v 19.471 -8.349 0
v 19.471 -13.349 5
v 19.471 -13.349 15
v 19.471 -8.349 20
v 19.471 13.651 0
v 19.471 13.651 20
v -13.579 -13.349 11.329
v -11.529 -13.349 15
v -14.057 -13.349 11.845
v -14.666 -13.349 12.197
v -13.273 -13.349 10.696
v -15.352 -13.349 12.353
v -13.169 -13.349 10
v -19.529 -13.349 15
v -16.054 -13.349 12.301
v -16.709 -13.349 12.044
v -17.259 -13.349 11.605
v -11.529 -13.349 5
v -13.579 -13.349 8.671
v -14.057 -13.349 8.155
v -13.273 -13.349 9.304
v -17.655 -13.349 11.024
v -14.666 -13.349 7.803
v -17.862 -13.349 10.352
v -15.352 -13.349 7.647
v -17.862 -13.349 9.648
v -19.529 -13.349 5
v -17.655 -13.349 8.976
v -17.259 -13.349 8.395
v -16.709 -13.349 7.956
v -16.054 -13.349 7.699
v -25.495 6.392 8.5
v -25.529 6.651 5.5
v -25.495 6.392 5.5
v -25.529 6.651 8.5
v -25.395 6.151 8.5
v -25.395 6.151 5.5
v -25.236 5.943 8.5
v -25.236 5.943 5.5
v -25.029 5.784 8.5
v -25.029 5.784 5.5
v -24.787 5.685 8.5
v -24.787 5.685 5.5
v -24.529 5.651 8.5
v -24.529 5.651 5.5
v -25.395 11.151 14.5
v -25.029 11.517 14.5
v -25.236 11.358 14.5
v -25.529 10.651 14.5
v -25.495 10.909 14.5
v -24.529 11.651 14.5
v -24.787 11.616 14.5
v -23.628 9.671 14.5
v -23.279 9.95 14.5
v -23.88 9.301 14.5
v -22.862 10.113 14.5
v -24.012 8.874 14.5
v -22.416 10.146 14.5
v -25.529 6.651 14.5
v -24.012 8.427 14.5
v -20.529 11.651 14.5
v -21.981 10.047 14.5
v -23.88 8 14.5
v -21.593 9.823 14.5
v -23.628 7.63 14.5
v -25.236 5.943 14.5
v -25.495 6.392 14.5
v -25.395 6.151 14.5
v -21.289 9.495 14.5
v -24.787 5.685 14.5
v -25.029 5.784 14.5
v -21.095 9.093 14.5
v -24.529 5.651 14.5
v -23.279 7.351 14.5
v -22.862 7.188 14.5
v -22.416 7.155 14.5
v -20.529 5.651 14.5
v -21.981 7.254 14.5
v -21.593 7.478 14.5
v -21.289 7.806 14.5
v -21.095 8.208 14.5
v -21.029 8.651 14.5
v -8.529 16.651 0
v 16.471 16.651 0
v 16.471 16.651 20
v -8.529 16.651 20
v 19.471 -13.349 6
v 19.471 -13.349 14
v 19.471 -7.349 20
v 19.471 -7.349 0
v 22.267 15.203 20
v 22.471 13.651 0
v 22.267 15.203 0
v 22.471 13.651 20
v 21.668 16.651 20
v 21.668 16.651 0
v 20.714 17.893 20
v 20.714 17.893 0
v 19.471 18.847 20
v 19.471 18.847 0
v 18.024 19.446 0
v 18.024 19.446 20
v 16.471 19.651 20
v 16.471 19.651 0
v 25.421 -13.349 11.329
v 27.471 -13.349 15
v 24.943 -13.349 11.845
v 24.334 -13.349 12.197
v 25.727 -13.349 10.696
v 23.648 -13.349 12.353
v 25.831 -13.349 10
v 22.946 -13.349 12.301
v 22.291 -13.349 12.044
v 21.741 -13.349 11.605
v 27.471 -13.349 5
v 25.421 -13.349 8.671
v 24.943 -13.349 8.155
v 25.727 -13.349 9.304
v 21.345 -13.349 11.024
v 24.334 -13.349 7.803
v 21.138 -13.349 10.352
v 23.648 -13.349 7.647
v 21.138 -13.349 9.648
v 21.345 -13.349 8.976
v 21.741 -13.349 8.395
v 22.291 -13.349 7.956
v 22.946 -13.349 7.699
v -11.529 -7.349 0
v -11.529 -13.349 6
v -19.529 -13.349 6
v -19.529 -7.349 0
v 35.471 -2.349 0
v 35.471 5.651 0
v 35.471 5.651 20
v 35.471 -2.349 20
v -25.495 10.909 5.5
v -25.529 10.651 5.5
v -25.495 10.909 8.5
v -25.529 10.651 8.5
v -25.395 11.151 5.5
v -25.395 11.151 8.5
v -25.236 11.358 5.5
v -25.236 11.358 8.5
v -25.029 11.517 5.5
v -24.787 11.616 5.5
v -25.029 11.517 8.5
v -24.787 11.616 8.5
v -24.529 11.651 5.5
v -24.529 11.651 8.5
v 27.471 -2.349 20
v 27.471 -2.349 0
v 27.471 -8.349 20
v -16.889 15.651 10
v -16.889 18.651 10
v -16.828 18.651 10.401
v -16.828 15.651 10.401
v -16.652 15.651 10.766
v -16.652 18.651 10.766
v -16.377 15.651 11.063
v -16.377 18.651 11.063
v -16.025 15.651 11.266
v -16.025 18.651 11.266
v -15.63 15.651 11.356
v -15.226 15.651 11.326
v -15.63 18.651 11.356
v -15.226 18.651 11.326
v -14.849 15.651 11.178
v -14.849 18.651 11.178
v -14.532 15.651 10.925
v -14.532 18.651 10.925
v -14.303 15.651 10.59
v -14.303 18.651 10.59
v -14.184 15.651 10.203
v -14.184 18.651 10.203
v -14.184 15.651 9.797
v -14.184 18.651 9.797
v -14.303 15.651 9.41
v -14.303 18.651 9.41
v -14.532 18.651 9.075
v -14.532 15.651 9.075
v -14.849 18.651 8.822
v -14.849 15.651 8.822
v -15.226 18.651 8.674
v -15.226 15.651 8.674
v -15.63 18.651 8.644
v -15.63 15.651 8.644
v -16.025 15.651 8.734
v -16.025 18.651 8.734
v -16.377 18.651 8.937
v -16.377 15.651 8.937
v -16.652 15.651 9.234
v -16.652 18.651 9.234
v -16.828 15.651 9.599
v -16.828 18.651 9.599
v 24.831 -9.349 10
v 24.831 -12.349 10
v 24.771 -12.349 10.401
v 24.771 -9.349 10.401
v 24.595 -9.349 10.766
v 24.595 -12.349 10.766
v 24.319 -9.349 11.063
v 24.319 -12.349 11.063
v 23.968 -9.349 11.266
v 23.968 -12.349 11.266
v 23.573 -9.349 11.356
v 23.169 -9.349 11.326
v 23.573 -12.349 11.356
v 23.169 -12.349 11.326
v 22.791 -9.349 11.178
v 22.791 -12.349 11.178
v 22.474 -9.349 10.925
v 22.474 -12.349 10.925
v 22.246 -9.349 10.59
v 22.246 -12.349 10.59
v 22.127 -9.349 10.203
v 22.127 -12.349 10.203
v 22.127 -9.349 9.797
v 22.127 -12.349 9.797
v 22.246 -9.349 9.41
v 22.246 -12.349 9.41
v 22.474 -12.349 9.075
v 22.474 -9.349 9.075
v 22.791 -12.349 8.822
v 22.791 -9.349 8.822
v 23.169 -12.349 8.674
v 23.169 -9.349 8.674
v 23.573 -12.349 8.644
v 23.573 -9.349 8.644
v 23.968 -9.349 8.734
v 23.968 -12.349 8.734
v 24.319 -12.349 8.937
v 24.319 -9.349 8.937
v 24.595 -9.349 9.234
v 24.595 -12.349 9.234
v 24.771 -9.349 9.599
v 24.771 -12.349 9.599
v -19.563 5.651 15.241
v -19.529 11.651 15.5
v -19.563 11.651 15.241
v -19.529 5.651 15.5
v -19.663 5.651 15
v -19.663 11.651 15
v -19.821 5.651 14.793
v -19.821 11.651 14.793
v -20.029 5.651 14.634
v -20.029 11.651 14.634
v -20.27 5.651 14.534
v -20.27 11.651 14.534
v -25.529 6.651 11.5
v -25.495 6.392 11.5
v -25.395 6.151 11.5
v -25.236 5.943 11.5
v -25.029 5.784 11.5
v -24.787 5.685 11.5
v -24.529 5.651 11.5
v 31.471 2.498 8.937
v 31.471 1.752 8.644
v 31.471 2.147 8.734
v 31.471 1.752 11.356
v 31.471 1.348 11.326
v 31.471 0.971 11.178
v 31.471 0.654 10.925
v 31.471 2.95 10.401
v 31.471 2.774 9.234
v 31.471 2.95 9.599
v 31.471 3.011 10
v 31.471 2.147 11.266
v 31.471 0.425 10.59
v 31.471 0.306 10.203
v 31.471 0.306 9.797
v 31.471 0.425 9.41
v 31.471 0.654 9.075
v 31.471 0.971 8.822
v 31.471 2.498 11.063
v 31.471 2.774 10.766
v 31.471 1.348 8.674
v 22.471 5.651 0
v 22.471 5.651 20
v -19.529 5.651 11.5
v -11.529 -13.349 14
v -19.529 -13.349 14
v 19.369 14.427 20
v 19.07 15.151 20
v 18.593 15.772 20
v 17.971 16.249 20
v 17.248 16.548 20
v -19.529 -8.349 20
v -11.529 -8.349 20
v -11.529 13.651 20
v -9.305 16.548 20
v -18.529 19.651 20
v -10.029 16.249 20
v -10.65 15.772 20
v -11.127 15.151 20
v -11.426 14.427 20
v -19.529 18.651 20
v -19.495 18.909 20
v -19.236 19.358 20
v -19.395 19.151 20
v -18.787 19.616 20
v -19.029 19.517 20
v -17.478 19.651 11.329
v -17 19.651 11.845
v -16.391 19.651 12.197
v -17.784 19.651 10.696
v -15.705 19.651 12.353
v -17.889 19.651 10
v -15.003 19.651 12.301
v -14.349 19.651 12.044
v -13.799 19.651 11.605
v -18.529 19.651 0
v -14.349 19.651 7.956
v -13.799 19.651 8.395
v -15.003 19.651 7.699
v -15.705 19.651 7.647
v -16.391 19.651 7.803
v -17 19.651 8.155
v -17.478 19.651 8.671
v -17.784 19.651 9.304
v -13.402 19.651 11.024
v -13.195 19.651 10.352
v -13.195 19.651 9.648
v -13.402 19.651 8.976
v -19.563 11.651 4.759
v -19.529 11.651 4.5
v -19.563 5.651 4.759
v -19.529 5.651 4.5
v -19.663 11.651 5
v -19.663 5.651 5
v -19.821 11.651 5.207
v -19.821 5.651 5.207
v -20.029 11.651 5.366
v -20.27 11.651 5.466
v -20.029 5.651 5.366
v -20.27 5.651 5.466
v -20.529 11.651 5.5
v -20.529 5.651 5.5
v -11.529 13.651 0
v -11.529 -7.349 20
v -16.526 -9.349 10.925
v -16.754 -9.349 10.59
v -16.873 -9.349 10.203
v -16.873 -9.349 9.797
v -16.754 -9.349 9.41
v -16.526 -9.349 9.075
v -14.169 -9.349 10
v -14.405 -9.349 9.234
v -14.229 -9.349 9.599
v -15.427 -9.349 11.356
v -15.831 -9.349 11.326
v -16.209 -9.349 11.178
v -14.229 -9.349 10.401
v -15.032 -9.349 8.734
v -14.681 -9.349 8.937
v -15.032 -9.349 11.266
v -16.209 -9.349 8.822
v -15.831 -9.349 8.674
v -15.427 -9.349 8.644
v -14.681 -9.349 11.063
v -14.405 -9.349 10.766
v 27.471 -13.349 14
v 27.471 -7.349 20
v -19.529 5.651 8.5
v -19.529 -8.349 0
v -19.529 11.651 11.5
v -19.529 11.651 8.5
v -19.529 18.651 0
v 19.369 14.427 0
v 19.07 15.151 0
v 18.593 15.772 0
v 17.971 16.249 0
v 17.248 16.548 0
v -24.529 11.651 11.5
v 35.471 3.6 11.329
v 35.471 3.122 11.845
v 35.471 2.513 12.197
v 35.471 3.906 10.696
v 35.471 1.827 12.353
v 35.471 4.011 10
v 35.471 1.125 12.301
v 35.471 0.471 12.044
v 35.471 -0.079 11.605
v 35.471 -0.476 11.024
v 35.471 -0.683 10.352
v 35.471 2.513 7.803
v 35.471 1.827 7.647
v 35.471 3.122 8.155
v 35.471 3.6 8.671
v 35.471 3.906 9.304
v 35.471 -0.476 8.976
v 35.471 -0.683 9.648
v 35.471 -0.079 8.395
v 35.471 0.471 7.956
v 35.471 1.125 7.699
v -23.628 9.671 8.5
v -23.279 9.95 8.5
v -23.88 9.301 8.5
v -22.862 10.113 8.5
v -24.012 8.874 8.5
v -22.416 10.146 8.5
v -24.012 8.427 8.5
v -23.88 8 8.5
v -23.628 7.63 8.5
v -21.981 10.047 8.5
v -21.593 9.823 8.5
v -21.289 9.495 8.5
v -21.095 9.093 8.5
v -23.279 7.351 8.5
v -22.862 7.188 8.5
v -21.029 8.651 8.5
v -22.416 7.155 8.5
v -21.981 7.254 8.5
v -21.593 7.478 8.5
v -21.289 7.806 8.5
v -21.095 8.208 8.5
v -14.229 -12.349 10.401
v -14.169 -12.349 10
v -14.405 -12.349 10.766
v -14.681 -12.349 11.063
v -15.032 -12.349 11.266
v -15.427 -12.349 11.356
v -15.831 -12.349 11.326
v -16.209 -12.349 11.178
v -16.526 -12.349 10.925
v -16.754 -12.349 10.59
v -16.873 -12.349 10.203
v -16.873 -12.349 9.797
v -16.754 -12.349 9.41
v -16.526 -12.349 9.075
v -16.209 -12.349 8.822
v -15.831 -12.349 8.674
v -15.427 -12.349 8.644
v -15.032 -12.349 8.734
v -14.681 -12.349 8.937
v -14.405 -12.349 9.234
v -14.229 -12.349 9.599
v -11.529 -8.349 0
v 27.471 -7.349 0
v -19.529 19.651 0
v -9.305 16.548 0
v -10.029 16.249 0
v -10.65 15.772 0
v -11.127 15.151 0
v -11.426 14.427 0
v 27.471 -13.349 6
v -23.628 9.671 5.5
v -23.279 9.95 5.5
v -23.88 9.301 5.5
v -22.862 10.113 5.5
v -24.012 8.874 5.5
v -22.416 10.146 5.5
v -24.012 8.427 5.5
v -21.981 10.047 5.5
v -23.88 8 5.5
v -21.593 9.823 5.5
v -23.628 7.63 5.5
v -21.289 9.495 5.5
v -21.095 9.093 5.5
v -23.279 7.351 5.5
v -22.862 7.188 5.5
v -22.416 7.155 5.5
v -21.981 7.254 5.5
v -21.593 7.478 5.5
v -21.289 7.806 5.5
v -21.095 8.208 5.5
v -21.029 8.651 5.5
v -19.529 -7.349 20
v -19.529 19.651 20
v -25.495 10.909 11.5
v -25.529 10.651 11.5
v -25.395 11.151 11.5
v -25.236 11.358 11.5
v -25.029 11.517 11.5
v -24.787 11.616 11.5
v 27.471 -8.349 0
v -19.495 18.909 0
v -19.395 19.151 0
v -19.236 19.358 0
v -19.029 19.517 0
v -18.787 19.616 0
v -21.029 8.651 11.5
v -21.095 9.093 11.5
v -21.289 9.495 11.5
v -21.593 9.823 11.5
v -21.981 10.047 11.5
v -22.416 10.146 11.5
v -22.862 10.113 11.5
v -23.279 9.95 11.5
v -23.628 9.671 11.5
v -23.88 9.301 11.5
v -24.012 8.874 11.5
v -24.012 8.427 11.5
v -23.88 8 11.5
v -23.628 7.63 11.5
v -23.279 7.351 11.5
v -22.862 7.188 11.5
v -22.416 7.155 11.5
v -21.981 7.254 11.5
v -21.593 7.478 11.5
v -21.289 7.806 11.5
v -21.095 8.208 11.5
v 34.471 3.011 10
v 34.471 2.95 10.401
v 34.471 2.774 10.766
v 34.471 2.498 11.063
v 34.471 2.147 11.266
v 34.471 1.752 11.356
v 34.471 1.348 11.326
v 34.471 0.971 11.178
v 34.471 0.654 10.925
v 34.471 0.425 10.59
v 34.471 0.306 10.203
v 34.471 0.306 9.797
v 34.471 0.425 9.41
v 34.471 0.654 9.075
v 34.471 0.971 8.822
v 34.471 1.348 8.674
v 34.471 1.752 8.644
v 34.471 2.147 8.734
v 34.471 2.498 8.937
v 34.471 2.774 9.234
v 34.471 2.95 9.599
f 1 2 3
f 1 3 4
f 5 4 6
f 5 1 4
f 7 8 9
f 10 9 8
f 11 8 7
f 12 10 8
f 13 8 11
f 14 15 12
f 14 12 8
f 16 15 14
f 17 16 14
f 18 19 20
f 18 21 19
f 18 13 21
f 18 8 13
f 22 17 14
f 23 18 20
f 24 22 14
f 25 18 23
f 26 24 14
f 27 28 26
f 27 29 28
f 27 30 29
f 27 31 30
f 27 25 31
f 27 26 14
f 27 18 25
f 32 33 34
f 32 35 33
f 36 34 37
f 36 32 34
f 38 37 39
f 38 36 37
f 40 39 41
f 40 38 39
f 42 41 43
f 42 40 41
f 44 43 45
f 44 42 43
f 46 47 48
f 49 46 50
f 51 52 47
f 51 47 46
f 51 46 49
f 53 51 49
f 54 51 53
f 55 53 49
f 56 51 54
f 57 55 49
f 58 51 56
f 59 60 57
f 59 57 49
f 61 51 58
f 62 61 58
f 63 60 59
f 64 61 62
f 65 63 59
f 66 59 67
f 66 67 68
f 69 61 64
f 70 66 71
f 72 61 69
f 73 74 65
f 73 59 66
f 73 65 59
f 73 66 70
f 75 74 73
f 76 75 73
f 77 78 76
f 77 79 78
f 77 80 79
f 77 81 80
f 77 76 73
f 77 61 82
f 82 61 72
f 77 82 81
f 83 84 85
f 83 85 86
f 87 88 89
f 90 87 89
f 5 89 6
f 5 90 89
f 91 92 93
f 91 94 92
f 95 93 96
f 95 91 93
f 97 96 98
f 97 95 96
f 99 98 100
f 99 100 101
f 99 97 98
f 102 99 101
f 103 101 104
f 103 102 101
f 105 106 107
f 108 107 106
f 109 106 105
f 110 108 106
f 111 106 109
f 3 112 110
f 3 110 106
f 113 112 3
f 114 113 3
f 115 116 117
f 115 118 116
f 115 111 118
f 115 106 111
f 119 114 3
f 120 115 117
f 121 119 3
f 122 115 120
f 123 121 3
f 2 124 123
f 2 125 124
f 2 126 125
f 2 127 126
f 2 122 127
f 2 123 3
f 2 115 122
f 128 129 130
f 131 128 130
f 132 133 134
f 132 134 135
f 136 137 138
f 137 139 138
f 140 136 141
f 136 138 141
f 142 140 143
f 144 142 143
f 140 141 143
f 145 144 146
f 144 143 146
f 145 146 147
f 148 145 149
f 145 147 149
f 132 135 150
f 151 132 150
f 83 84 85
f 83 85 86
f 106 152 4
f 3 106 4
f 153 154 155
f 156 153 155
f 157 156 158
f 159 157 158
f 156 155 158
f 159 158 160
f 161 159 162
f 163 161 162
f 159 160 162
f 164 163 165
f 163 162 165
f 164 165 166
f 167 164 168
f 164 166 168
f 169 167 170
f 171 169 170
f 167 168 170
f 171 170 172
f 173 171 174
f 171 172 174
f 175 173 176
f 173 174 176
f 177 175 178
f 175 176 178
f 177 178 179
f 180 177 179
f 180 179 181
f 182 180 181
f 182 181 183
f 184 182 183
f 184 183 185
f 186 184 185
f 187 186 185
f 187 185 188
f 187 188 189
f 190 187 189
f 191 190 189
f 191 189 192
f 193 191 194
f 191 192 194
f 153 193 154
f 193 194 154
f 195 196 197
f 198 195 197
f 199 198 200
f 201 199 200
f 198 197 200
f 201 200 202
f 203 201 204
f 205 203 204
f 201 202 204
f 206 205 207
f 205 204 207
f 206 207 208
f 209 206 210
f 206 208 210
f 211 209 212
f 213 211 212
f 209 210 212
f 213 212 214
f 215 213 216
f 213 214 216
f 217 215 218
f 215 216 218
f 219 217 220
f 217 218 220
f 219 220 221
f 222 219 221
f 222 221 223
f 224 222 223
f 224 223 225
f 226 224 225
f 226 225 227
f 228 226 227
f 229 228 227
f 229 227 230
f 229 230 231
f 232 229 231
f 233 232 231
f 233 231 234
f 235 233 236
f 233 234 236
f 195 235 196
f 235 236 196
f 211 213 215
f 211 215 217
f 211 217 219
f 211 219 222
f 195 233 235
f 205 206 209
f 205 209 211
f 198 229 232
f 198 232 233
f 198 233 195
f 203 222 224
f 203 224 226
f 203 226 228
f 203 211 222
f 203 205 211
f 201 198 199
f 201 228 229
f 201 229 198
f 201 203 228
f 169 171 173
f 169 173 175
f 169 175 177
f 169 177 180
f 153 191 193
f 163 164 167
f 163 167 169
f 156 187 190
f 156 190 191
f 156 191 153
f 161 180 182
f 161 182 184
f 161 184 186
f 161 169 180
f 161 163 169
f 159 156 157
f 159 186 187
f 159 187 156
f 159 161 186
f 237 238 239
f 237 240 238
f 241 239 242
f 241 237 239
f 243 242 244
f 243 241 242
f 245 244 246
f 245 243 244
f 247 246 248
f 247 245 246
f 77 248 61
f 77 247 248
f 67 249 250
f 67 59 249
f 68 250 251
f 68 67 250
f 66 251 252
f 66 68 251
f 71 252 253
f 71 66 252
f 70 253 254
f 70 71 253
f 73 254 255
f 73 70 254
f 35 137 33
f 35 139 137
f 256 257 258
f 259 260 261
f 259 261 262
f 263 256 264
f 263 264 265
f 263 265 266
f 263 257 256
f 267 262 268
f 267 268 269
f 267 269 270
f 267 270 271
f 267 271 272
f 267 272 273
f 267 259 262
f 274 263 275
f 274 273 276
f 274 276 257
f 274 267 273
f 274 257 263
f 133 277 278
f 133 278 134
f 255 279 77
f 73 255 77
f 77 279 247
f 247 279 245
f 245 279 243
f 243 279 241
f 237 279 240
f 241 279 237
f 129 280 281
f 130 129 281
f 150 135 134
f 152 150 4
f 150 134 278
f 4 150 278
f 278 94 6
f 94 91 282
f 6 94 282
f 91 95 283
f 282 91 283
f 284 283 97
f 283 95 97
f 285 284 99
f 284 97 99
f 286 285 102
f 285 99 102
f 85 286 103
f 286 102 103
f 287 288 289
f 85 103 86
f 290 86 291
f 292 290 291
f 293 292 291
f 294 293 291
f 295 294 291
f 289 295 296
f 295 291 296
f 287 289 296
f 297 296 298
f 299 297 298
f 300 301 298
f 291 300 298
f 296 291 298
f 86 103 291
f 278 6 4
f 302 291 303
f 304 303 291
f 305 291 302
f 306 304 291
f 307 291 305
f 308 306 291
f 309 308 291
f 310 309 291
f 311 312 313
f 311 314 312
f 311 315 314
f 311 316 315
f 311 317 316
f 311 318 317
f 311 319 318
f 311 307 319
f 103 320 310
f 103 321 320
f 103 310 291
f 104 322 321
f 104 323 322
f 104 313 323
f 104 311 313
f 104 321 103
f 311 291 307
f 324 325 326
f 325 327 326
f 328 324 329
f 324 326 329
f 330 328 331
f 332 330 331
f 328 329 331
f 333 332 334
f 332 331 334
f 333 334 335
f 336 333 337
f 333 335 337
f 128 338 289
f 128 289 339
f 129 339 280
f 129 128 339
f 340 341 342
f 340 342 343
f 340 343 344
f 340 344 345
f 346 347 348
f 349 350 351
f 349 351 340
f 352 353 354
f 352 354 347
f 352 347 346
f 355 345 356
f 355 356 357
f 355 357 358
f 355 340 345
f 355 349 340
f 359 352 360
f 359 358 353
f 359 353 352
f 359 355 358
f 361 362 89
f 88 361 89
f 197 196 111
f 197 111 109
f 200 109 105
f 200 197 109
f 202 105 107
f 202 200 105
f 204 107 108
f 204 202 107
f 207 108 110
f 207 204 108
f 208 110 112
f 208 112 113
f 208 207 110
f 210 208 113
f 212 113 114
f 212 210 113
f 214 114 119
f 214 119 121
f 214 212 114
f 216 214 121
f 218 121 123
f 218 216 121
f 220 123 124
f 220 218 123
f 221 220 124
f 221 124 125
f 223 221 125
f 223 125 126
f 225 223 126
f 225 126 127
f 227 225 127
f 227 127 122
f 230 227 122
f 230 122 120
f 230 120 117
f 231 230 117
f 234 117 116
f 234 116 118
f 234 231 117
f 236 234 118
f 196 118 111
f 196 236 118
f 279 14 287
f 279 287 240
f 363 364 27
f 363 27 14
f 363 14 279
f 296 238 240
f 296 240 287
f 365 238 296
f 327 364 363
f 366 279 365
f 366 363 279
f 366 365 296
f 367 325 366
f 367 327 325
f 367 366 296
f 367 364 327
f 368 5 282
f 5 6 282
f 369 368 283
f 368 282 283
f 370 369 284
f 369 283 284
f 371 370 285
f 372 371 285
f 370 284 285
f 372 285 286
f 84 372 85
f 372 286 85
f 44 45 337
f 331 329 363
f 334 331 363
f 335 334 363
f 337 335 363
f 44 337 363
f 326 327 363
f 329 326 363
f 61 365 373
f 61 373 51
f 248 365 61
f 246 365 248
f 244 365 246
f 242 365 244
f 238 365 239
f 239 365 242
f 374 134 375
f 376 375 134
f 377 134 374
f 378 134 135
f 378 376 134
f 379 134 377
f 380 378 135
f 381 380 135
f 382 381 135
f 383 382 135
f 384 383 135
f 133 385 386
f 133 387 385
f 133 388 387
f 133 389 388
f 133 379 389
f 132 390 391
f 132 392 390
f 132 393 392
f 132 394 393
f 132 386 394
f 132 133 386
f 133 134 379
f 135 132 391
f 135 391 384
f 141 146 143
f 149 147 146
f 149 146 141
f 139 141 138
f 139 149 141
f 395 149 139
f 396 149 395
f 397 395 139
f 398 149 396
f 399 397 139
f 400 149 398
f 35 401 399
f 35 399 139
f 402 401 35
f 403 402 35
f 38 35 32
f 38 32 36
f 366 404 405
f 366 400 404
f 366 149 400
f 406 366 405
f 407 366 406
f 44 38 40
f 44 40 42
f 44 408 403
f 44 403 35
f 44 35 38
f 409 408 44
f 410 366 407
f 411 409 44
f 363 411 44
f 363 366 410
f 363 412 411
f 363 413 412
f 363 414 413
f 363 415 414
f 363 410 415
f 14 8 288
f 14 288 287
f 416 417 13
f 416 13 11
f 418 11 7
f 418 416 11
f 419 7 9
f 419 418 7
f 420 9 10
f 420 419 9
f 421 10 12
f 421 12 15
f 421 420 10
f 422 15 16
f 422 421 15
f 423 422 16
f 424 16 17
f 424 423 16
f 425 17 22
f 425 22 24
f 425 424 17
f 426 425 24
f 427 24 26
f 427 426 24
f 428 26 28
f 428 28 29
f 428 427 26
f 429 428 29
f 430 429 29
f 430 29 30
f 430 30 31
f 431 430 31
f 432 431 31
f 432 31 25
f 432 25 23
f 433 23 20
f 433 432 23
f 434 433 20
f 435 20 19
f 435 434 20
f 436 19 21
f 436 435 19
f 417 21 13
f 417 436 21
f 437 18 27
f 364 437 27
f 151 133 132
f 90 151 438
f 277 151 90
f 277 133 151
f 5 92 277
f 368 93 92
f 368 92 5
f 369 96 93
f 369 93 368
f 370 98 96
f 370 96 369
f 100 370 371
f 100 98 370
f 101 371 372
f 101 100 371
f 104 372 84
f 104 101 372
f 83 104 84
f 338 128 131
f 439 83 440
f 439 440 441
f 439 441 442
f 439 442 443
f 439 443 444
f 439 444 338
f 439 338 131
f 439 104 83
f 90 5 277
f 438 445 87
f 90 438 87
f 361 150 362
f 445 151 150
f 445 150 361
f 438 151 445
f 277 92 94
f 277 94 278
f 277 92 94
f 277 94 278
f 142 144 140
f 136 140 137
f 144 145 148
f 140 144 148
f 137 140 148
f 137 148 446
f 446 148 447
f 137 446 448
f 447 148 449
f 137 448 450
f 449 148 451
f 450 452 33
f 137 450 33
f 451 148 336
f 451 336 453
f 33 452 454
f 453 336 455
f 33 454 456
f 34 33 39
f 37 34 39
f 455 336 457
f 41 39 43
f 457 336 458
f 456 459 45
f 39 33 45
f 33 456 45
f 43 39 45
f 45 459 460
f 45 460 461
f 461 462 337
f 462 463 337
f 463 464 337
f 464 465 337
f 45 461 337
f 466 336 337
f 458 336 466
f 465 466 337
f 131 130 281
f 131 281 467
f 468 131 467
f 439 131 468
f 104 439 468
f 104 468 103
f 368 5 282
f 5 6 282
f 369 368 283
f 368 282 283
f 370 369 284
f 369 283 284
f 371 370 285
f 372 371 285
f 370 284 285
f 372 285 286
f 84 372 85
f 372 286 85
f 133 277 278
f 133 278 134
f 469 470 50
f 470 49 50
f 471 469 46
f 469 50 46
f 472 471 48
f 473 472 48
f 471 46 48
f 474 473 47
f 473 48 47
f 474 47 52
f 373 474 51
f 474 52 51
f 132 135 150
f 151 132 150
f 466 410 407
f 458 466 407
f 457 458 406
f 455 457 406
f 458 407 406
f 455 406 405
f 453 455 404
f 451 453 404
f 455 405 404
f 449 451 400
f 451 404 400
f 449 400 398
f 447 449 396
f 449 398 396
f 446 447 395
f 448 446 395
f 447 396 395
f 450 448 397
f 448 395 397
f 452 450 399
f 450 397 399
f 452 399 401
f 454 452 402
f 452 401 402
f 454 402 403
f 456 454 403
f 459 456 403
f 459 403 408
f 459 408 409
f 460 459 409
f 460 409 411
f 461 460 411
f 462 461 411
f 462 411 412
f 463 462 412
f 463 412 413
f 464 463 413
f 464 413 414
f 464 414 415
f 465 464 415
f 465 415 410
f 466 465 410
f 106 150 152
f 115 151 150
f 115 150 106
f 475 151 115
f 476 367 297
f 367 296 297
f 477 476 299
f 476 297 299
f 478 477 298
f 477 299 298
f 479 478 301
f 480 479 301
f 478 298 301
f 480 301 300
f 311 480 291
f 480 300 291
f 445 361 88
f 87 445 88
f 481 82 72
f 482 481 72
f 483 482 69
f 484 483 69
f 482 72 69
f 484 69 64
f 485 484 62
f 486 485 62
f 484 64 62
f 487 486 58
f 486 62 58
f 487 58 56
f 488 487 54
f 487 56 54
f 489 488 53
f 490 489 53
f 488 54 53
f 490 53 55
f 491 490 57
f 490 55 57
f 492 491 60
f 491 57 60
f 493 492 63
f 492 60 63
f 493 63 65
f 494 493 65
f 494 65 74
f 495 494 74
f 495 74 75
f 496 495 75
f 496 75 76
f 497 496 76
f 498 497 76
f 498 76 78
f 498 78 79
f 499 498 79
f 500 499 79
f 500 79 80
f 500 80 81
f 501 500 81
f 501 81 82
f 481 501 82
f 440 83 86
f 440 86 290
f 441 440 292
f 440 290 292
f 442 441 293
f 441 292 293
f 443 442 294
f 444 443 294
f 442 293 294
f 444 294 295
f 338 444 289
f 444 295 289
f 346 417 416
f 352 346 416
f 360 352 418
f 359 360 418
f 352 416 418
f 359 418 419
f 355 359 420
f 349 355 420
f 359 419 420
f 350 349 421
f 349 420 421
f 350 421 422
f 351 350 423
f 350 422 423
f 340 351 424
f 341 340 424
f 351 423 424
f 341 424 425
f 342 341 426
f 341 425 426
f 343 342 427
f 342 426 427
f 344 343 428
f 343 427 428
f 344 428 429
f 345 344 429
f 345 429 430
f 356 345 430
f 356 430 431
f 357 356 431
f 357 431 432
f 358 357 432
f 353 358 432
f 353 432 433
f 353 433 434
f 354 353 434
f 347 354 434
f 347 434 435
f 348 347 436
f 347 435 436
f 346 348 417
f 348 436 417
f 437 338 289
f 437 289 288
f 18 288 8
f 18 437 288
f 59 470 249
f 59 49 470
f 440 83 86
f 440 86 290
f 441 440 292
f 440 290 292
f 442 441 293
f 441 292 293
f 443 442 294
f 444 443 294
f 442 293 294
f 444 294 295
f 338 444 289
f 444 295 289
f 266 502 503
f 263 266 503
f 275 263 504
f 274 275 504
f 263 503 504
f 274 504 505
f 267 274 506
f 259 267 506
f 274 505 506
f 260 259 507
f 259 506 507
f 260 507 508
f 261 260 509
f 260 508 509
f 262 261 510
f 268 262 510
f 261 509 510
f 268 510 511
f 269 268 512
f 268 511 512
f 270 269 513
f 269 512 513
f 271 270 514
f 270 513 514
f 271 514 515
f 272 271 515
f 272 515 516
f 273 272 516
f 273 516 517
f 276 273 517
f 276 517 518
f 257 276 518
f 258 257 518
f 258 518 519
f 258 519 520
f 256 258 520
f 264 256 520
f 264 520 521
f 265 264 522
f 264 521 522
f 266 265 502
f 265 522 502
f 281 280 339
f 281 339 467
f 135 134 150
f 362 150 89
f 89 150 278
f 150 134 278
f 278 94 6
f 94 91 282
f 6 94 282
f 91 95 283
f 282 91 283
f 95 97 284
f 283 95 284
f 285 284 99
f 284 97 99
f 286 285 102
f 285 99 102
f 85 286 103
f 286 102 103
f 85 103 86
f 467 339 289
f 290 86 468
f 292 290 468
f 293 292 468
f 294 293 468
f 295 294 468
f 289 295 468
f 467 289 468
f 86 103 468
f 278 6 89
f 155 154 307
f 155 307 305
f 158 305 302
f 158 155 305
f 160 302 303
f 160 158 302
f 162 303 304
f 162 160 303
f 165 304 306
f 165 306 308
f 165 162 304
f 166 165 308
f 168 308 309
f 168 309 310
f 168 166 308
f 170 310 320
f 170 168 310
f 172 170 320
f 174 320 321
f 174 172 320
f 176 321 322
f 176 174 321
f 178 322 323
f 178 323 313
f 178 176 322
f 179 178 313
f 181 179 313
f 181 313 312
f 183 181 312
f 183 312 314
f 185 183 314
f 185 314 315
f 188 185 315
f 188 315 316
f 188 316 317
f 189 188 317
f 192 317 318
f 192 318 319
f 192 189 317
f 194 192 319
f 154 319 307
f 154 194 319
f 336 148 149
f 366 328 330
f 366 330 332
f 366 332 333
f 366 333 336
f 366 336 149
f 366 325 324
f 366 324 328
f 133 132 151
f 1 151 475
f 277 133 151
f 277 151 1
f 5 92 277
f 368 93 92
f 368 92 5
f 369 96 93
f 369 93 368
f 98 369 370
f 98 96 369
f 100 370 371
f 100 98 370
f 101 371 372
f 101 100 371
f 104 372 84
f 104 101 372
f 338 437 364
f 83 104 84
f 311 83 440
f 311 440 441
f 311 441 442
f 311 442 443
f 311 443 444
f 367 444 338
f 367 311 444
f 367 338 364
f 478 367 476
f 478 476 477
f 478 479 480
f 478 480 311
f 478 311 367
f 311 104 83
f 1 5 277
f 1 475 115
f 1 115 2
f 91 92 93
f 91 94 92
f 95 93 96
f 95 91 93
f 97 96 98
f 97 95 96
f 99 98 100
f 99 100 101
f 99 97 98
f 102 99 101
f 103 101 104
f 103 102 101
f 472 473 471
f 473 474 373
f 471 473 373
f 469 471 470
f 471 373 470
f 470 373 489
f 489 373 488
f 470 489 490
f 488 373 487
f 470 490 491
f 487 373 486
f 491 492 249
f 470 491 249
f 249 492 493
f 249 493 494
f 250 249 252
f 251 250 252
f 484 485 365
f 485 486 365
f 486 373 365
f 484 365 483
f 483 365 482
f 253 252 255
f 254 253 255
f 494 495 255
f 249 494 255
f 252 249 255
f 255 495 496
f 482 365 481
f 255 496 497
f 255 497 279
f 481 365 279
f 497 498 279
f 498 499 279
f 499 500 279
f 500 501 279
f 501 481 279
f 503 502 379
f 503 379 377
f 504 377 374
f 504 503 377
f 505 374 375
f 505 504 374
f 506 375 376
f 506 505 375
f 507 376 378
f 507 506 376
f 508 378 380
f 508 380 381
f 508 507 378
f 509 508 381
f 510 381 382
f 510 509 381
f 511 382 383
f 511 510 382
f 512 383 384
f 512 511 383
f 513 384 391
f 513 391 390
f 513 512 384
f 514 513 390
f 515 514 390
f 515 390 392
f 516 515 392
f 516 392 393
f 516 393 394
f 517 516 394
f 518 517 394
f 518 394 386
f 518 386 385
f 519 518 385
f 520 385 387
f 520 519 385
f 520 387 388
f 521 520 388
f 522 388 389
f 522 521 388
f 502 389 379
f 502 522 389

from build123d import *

# Parameters (mm, degrees)
PAD_DEPTH       = 20
FILLET_R        = 3
FILLET001_R     = 6
CHAMFER_SIZE    = 6
SKETCH002_R     = 1.36
POCKET_DEPTH    = 4
CHAMFER001_SIZE = 1
SKETCH003_R     = 1.36
POCKET001_DEPTH = 4
CHAMFER002_SIZE = 1
SKETCH004_R     = 1.36
POCKET002_DEPTH = 4
CHAMFER003_SIZE = 1
CHAMFER004_SIZE = 5
SKETCH005_R     = 1.36
POCKET003_DEPTH = 4
CHAMFER005_SIZE = 1
SKETCH006_W     = 6
SKETCH006_H     = 3
PAD001_DEPTH    = 6
SKETCH007_R     = 1.5
POCKET004_DEPTH = 14.501
FILLET002_R     = 1
FILLET003_R     = 1
FILLET004_R     = 1


with BuildPart() as fillet001:
    # Sketch → Pad (new body)
    with BuildSketch(Plane.XY):
        Polygon((-19.528576, -13.349491), (-19.528576, 19.650509), (22.471424, 19.650509), (22.471424, 5.650509), (35.471424, 5.650509), (35.471424, -2.349491), (27.471424, -2.349491), (27.471424, -13.349491), (19.471424, -13.349491), (19.471424, 16.650509), (-11.528576, 16.650509), (-11.528576, -13.349491), align=None)
    extrude(amount=PAD_DEPTH)

    # Fillet
    fillet_edges = [fillet001.edges().sort_by_distance(p)[0] for p in [
        (-11.528576, 16.650509, 10),
        (19.471424, 16.650509, 10),
    ]]
    fillet(fillet_edges, radius=FILLET_R)

    # Fillet001
    fillet001_edges = [fillet001.edges().sort_by_distance(p)[0] for p in [
        (22.471424, 19.650509, 10),
    ]]
    fillet(fillet001_edges, radius=FILLET001_R)


with BuildPart() as chamfer_body:
    # Chamfer base: copy of Fillet001
    add(fillet001.part)

    # Chamfer
    chamfer_edges = [chamfer_body.edges().sort_by_distance(p)[0] for p in [
        (-15.528576, -13.349491, 20),
        (-15.528576, -13.349491, 0),
        (23.471424, -13.349491, 20),
        (23.471424, -13.349491, 0),
    ]]
    chamfer(chamfer_edges, length=CHAMFER_SIZE)


with BuildPart() as definitiva:
    # Pocket base: copy of Fillet001
    add(fillet001.part)

    # Sketch002 → Pocket (cut)
    with BuildSketch(Plane.YZ.offset(35.471424)):
        with Locations((1.650509, 10)):
            Circle(SKETCH002_R)
    extrude(amount=-POCKET_DEPTH, mode=Mode.SUBTRACT)

    # Chamfer001
    chamfer001_edges = [definitiva.edges().sort_by_distance(p)[0] for p in [
        (35.471424, 0.290509, 10),
    ]]
    chamfer(chamfer001_edges, length=CHAMFER001_SIZE)

    # Sketch003 → Pocket001 (cut)
    with BuildSketch(Plane.XZ.offset(13.349491)):
        with Locations((-15.528576, 10)):
            Circle(SKETCH003_R)
    extrude(amount=-POCKET001_DEPTH, mode=Mode.SUBTRACT)

    # Chamfer002
    chamfer002_edges = [definitiva.edges().sort_by_distance(p)[0] for p in [
        (-16.888576, -13.349491, 10),
    ]]
    chamfer(chamfer002_edges, length=CHAMFER002_SIZE)

    # Sketch004 → Pocket002 (cut)
    with BuildSketch(Plane.XZ.offset(13.349491)):
        with Locations((23.471424, 10)):
            Circle(SKETCH004_R)
    extrude(amount=-POCKET002_DEPTH, mode=Mode.SUBTRACT)

    # Chamfer003
    chamfer003_edges = [definitiva.edges().sort_by_distance(p)[0] for p in [
        (22.111424, -13.349491, 10),
    ]]
    chamfer(chamfer003_edges, length=CHAMFER003_SIZE)

    # Chamfer004
    chamfer004_edges = [definitiva.edges().sort_by_distance(p)[0] for p in [
        (-15.528576, -13.349491, 20),
        (-15.528576, -13.349491, 0),
        (23.471424, -13.349491, 20),
        (23.471424, -13.349491, 0),
    ]]
    chamfer(chamfer004_edges, length=CHAMFER004_SIZE)

    # Sketch005 → Pocket003 (cut)
    with BuildSketch(Plane(origin=(0, 19.650509, 0), x_dir=(-1, 0, 0), z_dir=(0, 1, 0))):
        with Locations((15.528576, 10)):
            Circle(SKETCH005_R)
    extrude(amount=-POCKET003_DEPTH, mode=Mode.SUBTRACT)

    # Chamfer005
    chamfer005_edges = [definitiva.edges().sort_by_distance(p)[0] for p in [
        (-14.168576, 19.650509, 10),
    ]]
    chamfer(chamfer005_edges, length=CHAMFER005_SIZE)

    # Sketch006 → Pad001 (new body)
    with BuildSketch(Plane(origin=(-19.528576, 0, 0), x_dir=(0, -1, 0), z_dir=(-1, 0, 0))):
        with Locations((-8.650509, 13)):
            Rectangle(SKETCH006_W, SKETCH006_H)
        with Locations((-8.650509, 7)):
            Rectangle(SKETCH006_W, SKETCH006_H)
    extrude(amount=PAD001_DEPTH)

    # Sketch007 → Pocket004 (cut, through all)
    with BuildSketch(Plane.XY.offset(14.5)):
        with Locations((-22.528576, 8.650509)):
            Circle(SKETCH007_R)
    extrude(amount=-POCKET004_DEPTH, mode=Mode.SUBTRACT)

    # Fillet002
    fillet002_edges = [definitiva.edges().sort_by_distance(p)[0] for p in [
        (-19.528576, 8.650509, 5.5),
        (-19.528576, 8.650509, 14.5),
    ]]
    fillet(fillet002_edges, radius=FILLET002_R)

    # Fillet003
    fillet003_edges = [definitiva.edges().sort_by_distance(p)[0] for p in [
        (-25.528576, 11.650509, 7),
        (-25.528576, 11.650509, 13),
        (-25.528576, 5.650509, 7),
        (-25.528576, 5.650509, 13),
    ]]
    fillet(fillet003_edges, radius=FILLET003_R)

    # Fillet004
    fillet004_edges = [definitiva.edges().sort_by_distance(p)[0] for p in [
        (-19.528576, 19.650509, 10),
    ]]
    fillet(fillet004_edges, radius=FILLET004_R)


solid = Compound([chamfer_body.part, definitiva.part])
